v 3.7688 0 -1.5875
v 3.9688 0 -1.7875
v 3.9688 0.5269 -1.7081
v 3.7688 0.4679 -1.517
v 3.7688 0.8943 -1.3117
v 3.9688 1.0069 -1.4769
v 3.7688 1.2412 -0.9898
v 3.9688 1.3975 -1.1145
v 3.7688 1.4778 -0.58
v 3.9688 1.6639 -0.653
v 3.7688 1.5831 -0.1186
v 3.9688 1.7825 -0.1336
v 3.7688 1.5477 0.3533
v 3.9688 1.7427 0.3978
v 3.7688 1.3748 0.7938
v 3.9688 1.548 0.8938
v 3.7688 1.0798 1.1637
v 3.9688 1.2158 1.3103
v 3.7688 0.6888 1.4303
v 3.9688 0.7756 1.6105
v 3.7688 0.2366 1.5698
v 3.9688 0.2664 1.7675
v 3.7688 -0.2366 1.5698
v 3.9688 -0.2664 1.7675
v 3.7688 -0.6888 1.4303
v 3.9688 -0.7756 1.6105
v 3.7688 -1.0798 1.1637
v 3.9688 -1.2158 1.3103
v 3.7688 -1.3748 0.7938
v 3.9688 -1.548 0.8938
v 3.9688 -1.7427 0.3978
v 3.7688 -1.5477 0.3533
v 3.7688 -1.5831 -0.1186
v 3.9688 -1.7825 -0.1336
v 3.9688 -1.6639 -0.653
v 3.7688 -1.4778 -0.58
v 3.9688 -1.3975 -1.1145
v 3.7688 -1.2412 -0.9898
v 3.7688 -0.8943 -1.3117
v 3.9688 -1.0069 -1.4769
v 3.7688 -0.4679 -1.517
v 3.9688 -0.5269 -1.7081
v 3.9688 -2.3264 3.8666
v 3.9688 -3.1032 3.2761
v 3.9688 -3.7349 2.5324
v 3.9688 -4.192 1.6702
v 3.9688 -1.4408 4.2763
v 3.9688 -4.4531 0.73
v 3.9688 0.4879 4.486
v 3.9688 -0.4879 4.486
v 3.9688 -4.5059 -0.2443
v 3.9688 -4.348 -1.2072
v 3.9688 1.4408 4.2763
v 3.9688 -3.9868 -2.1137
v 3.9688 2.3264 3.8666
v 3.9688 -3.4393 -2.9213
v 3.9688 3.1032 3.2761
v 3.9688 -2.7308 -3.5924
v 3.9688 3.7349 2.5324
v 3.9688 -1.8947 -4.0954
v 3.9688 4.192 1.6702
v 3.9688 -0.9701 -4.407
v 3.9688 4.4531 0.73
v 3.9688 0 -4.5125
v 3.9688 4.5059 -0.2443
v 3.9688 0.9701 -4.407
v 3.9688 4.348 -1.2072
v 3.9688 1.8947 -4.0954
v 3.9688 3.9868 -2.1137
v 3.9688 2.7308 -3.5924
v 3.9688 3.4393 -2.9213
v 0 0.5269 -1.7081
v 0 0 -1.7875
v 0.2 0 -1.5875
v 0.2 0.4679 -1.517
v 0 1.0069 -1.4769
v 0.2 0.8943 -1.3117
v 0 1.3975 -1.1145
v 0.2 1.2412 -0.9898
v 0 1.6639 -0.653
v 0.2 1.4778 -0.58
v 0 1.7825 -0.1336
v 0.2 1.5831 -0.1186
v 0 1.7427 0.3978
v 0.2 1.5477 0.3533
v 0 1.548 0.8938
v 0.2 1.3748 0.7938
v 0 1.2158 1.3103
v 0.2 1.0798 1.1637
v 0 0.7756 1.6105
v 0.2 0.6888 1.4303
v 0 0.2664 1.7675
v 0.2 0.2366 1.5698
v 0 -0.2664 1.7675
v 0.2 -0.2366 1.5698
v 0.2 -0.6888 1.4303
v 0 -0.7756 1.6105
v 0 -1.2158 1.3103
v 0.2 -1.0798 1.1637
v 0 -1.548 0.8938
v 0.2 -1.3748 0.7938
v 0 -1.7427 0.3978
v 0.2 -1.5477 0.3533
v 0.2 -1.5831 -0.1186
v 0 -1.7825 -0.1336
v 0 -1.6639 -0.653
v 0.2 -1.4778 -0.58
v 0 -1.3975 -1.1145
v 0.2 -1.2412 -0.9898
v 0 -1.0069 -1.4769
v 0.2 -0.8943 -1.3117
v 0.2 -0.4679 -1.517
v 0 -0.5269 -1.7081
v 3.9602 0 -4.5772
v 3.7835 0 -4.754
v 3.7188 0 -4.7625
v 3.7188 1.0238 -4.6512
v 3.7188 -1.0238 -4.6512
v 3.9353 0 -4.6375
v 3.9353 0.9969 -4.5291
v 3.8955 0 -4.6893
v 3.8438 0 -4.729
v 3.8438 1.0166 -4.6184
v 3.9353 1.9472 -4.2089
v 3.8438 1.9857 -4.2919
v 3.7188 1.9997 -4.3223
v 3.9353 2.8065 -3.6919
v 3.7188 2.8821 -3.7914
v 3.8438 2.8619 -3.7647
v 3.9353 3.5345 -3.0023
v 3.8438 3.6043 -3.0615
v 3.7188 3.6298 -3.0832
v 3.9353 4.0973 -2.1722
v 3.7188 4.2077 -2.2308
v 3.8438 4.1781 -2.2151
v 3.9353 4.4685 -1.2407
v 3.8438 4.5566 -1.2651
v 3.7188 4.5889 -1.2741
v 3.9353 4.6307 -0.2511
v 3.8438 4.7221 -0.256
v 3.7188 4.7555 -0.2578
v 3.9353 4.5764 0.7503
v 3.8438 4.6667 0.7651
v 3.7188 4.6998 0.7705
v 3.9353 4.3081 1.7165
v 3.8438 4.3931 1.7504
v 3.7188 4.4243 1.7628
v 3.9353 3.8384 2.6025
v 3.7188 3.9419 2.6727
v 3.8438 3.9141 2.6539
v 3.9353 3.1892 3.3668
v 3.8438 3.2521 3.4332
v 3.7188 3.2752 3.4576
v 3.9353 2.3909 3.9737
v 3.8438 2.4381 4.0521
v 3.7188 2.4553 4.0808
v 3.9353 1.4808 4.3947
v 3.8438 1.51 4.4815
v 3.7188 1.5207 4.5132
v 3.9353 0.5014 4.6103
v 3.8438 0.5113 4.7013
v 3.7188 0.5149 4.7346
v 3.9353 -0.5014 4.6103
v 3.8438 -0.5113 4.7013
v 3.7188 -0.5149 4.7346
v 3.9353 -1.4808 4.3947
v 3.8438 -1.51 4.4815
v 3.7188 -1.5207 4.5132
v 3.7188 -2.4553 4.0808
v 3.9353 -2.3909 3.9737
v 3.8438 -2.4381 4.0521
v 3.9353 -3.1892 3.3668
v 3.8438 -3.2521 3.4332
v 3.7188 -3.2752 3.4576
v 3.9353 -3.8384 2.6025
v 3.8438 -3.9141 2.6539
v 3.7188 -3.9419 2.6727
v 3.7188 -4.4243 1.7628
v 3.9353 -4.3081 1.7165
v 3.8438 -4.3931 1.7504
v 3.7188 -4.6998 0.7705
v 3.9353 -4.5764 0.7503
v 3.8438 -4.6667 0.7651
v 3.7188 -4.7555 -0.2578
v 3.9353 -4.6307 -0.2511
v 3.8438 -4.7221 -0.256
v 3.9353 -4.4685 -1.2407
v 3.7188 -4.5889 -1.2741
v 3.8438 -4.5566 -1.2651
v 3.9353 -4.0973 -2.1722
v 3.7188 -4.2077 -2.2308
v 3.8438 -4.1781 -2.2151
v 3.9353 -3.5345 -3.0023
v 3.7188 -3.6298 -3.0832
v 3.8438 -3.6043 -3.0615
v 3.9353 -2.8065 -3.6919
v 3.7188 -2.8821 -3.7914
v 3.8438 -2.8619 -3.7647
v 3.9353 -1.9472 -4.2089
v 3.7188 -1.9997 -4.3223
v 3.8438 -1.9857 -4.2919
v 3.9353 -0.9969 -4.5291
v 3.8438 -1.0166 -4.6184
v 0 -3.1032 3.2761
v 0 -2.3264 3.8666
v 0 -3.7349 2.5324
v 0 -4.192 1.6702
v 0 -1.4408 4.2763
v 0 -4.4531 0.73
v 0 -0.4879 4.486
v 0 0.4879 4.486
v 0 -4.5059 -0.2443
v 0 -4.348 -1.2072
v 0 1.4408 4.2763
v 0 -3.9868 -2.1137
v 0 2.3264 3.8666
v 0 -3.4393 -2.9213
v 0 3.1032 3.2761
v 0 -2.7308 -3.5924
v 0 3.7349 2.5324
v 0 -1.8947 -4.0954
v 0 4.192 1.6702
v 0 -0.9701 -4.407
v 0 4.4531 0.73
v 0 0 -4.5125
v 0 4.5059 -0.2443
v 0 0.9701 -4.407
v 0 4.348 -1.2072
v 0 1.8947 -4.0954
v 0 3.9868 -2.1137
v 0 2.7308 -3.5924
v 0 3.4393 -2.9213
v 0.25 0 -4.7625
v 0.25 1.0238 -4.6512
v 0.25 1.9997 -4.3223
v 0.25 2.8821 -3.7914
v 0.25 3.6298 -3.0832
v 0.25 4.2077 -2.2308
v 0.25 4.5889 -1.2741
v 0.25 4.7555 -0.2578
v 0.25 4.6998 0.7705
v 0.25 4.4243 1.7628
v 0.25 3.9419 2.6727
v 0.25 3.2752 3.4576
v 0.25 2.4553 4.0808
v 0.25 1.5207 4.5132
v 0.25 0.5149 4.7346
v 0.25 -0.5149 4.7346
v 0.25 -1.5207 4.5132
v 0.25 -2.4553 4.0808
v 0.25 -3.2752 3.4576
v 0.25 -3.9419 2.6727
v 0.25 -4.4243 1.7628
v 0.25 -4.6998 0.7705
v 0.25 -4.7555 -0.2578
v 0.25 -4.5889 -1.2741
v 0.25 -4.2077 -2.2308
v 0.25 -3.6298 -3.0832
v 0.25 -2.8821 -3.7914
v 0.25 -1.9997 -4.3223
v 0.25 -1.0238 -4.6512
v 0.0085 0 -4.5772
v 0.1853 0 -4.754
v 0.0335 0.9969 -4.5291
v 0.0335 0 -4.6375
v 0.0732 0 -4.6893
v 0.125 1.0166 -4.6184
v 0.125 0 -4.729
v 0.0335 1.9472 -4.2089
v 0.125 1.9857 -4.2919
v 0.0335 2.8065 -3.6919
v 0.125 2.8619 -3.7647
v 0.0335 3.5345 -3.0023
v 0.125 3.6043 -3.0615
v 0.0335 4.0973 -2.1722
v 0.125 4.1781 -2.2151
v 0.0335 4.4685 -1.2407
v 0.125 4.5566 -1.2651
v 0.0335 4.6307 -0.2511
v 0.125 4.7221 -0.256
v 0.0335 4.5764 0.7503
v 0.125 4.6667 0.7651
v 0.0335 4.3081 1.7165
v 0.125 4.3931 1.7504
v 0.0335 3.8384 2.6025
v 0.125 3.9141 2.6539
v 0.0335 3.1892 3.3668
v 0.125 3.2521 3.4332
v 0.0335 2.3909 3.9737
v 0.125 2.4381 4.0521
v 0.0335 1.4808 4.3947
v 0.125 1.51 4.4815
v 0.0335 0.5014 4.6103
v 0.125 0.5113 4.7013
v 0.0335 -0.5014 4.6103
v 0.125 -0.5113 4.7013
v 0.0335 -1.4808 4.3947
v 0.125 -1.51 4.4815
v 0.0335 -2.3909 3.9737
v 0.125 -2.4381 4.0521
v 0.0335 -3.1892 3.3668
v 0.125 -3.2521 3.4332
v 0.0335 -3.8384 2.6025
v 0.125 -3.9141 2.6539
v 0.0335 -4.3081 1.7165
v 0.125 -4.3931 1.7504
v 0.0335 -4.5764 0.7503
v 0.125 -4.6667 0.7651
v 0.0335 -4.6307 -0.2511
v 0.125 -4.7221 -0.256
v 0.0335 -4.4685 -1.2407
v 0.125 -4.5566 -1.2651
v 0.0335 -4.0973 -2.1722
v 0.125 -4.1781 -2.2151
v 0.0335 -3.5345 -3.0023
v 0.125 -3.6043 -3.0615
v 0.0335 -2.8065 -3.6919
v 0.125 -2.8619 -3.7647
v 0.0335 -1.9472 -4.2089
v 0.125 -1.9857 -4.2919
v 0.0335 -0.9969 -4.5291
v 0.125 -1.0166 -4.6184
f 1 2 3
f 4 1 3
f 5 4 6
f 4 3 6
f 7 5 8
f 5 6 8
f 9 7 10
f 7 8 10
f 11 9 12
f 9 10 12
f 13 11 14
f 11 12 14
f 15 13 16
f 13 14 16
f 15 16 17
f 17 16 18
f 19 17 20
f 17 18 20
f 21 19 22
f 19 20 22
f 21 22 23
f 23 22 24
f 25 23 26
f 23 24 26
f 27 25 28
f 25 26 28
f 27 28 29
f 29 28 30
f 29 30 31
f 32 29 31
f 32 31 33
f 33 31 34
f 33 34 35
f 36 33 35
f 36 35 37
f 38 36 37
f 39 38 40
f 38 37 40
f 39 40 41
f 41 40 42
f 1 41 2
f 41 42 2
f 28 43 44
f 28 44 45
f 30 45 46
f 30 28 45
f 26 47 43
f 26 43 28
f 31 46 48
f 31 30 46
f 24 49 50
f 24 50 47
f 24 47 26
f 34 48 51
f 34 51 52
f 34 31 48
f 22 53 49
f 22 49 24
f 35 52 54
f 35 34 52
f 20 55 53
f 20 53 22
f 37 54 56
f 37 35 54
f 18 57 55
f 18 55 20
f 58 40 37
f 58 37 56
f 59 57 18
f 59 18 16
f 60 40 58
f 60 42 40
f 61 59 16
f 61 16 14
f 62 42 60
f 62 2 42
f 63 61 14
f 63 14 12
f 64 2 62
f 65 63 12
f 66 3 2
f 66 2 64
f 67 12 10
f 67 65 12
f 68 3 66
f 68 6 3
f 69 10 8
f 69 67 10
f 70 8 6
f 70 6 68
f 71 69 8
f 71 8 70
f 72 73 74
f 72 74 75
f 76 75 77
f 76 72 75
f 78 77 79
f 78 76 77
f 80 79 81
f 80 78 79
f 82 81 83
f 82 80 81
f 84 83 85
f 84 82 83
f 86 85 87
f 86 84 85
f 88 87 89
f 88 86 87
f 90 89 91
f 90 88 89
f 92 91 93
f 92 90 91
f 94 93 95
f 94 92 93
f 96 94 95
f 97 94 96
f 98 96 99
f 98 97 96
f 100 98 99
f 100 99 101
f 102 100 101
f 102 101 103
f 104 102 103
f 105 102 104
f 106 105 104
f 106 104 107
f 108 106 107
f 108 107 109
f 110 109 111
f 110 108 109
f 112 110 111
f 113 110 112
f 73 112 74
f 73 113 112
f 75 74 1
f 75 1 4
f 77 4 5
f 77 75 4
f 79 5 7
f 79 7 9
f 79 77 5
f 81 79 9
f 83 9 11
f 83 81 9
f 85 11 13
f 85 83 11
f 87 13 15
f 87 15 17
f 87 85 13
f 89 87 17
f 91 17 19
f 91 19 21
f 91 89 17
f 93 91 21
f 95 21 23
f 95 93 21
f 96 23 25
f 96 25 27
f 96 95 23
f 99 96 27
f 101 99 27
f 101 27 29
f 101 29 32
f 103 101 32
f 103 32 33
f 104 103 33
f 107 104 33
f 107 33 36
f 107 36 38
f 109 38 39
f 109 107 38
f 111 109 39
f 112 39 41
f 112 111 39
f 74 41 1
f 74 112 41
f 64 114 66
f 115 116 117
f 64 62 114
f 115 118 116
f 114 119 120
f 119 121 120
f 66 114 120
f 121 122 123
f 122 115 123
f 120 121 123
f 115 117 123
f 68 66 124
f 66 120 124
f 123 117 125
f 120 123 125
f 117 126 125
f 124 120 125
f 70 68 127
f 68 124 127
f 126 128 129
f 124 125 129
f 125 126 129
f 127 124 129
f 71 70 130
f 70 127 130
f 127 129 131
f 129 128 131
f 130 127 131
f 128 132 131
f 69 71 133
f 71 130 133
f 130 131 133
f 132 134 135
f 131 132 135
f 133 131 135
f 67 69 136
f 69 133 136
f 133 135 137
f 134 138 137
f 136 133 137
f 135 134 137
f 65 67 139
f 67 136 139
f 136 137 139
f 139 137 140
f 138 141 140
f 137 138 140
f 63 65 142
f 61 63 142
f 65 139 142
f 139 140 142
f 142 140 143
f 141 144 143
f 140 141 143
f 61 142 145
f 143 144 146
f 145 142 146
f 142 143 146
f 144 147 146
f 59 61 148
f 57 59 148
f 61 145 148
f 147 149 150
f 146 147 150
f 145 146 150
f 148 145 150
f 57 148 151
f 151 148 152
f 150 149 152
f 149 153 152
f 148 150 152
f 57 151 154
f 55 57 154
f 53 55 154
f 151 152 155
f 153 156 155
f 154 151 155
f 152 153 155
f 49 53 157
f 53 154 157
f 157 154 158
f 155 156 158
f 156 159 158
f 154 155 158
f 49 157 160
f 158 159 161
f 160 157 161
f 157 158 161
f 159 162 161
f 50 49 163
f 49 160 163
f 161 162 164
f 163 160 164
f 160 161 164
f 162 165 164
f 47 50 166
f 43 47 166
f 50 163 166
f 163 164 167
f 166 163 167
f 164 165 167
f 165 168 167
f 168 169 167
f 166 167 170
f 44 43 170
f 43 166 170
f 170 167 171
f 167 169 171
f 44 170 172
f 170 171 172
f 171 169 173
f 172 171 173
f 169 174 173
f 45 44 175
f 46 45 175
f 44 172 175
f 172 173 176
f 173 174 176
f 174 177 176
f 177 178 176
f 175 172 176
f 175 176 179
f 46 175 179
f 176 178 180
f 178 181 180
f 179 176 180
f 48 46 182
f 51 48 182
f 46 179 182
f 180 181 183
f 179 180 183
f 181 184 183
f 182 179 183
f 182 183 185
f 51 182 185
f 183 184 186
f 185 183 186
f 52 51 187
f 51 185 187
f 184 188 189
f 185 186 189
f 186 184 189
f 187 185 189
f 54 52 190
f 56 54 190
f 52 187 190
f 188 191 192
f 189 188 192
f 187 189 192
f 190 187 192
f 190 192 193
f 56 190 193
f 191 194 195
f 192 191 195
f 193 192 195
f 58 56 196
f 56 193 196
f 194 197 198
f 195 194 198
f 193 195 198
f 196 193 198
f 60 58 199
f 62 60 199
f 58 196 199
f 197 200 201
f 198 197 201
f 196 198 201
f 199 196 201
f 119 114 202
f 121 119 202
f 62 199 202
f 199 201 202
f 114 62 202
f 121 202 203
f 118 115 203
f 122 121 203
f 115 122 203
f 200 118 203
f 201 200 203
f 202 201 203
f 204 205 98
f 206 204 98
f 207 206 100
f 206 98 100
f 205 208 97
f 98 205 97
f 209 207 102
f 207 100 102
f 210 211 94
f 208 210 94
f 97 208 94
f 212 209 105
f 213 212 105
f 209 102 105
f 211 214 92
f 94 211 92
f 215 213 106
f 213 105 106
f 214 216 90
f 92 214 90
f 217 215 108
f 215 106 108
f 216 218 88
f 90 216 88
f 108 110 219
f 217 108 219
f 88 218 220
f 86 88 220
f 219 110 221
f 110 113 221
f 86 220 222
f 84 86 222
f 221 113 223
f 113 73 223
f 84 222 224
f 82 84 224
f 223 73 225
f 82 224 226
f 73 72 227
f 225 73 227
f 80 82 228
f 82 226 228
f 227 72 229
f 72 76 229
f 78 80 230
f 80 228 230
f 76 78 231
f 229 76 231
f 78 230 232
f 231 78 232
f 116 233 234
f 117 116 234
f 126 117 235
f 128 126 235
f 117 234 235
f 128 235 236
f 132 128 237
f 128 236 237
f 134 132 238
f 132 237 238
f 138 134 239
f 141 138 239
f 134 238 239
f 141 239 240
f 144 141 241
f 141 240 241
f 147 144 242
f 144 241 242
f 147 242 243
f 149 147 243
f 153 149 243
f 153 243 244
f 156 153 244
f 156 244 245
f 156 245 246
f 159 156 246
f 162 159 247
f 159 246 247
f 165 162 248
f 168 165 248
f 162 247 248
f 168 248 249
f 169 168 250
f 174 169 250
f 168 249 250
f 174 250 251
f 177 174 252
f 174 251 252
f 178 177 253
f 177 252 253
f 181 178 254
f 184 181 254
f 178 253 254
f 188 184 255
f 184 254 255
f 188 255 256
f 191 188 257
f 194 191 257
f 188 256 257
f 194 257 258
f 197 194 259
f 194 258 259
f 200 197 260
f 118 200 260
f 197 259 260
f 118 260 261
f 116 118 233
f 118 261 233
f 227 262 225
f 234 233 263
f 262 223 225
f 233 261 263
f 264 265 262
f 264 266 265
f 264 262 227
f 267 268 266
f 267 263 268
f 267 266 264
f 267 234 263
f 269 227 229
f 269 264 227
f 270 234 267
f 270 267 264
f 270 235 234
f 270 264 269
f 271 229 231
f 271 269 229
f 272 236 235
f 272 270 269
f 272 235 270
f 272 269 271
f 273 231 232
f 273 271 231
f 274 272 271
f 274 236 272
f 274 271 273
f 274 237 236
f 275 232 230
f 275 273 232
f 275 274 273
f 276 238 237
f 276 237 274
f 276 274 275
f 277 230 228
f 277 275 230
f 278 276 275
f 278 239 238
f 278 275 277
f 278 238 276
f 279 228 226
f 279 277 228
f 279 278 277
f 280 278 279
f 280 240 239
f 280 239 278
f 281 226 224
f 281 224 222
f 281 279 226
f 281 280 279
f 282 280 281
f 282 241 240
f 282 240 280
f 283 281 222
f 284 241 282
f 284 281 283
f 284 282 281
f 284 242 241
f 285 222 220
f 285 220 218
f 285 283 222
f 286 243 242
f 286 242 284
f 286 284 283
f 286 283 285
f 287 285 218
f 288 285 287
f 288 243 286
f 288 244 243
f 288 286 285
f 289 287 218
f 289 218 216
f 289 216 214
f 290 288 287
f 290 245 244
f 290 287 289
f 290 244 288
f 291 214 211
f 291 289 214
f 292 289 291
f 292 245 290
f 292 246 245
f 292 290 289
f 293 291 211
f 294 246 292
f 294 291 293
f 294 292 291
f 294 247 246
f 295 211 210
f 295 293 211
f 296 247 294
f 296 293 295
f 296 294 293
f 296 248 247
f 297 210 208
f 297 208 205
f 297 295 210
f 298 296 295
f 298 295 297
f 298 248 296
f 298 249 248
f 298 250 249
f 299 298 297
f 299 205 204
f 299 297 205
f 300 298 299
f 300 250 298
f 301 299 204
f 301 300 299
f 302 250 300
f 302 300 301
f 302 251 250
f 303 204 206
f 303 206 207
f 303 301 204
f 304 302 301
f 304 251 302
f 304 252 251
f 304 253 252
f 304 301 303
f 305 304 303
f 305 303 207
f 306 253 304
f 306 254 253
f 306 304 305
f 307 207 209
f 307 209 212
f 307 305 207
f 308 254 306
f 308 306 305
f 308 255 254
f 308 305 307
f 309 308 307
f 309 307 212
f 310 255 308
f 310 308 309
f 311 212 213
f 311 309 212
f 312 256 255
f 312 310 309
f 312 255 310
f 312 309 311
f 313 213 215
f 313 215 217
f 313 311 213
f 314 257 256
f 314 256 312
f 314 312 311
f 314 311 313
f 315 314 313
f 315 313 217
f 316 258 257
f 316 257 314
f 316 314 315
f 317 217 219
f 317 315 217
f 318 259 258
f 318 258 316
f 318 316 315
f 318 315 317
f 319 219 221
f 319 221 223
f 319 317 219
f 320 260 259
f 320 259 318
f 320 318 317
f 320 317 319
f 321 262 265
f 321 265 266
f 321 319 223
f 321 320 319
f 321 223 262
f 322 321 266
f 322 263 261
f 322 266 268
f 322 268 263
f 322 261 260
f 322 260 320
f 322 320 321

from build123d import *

# Parameters (mm, degrees)
SKETCH1_R           = 4.7625
SKETCH1_R_2         = 1.5875
BOSS_EXTRUDE1_DEPTH = 3.96875
CHAMFER1_SIZE       = 0.2
FILLET1_R           = 0.25


with BuildPart() as part:
    # Sketch1 → Boss-Extrude1 (new body)
    with BuildSketch(Plane(origin=(0, 0, 0), x_dir=(0, 0, -1), z_dir=(1, 0, 0))):
        Circle(SKETCH1_R)
        Circle(SKETCH1_R_2, mode=Mode.SUBTRACT)
    extrude(amount=BOSS_EXTRUDE1_DEPTH)

    # Chamfer1
    chamfer1_edges = [part.edges().sort_by_distance(p)[0] for p in [
        (0, 0, 1.5875),
        (3.96875, 0, 1.5875),
    ]]
    chamfer(chamfer1_edges, length=CHAMFER1_SIZE)

    # Fillet1
    fillet1_edges = [part.edges().sort_by_distance(p)[0] for p in [
        (0, 0, 4.7625),
        (3.96875, 0, 4.7625),
    ]]
    fillet(fillet1_edges, radius=FILLET1_R)


solid = part.part
